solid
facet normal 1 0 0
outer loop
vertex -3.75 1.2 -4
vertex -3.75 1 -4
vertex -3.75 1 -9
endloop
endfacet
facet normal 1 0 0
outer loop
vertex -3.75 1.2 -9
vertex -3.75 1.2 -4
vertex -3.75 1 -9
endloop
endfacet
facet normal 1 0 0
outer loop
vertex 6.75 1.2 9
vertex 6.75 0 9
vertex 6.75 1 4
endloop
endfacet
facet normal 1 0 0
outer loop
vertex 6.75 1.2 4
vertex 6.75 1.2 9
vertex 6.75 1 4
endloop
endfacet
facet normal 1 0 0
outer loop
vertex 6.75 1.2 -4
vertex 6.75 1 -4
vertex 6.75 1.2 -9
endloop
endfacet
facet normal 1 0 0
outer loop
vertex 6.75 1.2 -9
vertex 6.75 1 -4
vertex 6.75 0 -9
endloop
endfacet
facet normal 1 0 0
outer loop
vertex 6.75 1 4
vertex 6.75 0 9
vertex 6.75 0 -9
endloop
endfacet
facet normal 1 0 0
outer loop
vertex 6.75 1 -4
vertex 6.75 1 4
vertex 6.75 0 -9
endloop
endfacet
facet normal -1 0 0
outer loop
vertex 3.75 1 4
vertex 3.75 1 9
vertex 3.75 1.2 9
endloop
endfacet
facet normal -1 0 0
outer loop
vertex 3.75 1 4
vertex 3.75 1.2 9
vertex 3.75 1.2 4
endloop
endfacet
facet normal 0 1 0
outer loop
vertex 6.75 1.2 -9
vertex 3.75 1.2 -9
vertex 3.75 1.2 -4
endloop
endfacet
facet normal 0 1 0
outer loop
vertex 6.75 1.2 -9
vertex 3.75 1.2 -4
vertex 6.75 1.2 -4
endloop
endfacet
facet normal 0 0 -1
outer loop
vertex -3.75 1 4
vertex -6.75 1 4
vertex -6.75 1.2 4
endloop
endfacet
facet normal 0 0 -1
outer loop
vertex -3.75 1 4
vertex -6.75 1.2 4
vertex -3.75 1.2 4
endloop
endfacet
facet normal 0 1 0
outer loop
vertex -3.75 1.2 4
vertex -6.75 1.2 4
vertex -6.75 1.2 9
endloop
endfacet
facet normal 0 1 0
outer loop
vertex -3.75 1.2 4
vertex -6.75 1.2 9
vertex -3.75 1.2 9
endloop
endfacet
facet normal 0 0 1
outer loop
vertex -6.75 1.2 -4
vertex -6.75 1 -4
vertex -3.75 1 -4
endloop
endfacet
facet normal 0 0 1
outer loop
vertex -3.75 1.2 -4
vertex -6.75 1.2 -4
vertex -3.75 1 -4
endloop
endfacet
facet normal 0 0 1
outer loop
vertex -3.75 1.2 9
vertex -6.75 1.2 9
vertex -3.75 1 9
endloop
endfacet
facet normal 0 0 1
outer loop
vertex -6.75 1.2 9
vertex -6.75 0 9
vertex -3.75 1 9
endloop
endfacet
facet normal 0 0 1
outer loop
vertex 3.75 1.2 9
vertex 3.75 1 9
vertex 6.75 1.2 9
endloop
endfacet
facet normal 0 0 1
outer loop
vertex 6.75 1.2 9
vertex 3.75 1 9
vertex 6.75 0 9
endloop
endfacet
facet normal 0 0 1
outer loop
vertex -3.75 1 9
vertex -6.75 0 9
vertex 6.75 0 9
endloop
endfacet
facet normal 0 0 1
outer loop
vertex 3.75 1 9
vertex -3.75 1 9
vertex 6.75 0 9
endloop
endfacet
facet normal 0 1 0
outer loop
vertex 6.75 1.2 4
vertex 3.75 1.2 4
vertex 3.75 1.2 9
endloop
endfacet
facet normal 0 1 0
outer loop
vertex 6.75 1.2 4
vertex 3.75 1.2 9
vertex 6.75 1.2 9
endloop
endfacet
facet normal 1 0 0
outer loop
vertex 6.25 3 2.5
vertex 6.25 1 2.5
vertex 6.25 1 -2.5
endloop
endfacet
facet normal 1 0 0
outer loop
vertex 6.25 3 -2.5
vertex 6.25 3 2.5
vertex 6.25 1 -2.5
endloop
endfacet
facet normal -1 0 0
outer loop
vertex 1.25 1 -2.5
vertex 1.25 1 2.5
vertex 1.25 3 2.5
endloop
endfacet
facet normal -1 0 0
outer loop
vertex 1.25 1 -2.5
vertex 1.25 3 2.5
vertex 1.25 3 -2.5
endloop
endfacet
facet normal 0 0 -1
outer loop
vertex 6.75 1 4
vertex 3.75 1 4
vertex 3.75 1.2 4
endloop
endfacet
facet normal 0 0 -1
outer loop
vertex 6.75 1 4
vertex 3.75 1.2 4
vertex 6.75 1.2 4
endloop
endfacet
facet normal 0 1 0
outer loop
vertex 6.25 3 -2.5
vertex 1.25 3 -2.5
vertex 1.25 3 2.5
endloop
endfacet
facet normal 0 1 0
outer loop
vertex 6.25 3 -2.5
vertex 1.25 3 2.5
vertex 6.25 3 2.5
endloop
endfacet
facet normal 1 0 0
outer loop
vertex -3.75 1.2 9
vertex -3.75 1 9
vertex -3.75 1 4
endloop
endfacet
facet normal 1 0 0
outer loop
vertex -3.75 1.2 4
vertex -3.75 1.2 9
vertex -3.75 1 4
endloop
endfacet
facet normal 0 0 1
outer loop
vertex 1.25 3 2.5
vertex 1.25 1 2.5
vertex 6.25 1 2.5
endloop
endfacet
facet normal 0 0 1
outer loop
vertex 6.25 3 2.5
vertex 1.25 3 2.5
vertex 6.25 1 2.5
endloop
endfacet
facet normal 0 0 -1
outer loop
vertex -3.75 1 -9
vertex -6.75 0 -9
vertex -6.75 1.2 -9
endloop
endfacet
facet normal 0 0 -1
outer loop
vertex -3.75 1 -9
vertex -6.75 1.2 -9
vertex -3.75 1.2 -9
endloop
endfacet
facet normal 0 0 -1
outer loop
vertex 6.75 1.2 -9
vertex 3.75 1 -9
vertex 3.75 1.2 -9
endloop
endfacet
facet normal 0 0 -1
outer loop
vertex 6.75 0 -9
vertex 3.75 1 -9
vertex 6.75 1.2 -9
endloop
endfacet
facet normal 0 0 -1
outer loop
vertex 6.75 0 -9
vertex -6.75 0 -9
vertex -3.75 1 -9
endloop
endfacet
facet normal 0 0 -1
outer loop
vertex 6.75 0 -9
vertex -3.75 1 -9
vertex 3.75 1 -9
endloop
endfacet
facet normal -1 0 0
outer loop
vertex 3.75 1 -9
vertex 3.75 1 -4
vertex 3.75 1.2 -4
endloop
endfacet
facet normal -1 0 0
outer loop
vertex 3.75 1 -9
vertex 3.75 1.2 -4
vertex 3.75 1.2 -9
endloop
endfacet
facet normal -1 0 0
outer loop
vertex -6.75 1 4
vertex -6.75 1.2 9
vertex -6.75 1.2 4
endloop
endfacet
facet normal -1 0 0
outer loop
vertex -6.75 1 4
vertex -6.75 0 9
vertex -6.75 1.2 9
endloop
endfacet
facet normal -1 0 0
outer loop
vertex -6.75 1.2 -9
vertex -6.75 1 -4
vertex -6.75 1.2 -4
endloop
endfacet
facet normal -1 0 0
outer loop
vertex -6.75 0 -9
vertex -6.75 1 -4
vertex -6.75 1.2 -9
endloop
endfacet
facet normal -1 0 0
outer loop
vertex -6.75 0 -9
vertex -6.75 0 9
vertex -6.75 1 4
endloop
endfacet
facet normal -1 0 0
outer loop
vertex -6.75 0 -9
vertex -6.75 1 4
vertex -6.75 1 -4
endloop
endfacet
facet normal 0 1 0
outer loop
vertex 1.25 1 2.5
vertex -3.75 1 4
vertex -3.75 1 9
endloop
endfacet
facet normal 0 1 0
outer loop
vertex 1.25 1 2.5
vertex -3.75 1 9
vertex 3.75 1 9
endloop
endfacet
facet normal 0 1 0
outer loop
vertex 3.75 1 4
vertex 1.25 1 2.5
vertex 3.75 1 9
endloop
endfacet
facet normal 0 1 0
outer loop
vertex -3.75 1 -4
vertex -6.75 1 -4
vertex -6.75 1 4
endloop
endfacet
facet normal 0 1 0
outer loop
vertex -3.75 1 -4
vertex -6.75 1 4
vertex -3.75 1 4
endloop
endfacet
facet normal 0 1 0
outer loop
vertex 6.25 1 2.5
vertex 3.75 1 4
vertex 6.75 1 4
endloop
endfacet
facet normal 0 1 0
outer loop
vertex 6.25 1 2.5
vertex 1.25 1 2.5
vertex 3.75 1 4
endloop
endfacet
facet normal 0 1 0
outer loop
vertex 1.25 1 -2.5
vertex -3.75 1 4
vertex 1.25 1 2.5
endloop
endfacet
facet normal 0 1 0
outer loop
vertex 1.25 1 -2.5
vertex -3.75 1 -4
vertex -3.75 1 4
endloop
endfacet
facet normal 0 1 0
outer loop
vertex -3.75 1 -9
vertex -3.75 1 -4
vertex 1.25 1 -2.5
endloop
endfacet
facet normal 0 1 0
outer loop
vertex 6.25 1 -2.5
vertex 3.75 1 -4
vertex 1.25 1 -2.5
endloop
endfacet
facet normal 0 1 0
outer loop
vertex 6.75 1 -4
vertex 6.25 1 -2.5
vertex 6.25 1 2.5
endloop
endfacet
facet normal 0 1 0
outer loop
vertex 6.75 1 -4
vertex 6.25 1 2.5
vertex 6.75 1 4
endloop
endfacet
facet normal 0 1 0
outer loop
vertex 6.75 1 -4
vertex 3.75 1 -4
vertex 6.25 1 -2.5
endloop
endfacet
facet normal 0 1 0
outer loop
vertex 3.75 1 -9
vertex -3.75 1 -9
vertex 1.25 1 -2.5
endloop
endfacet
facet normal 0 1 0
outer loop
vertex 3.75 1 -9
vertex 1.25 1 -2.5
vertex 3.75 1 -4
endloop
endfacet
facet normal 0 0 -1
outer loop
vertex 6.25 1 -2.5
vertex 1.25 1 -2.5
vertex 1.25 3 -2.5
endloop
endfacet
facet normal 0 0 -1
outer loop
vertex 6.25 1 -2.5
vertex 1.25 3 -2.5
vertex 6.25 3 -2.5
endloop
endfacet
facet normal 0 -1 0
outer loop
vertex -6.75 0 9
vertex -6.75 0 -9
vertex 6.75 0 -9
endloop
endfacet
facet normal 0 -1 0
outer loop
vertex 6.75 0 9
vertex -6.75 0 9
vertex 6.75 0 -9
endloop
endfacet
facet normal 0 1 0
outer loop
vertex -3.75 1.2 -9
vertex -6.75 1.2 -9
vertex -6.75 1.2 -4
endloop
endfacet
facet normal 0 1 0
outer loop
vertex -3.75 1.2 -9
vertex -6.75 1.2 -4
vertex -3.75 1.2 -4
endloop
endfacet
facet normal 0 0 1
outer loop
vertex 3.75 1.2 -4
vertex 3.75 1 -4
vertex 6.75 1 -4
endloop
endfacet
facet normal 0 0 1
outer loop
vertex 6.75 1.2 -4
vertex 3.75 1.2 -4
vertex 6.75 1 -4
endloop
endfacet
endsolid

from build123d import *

# Parameters (mm, degrees)
SKETCH_1_W      = 13.5
SKETCH_1_H      = 18
EXTRUDE_1_DEPTH = 1
SKETCH_2_W      = 3
SKETCH_2_H      = 5
EXTRUDE_2_DEPTH = 0.2
SKETCH_3_W      = 5
SKETCH_3_H      = 5
EXTRUDE_3_DEPTH = 2


with BuildPart() as part:
    # Эскиз1 → Бобышка-Вытянуть1 (new body)
    with BuildSketch(Plane(origin=(0, 0, 0), x_dir=(1, 0, 0), z_dir=(0, 1, 0))):
        Rectangle(SKETCH_1_W, SKETCH_1_H)
    extrude(amount=EXTRUDE_1_DEPTH)

    # Эскиз2 → Бобышка-Вытянуть2 (add)
    with BuildSketch(Plane(origin=(0, 1, 0), x_dir=(1, 0, 0), z_dir=(0, 1, 0))):
        with Locations((-5.25, -6.5)):
            Rectangle(SKETCH_2_W, SKETCH_2_H)
        with Locations((5.25, -6.5)):
            Rectangle(SKETCH_2_W, SKETCH_2_H)
        with Locations((-5.25, 6.5)):
            Rectangle(SKETCH_2_W, SKETCH_2_H)
        with Locations((5.25, 6.5)):
            Rectangle(SKETCH_2_W, SKETCH_2_H)
    extrude(amount=EXTRUDE_2_DEPTH)

    # Эскиз3 → Бобышка-Вытянуть3 (add)
    with BuildSketch(Plane(origin=(0, 1, 0), x_dir=(1, 0, 0), z_dir=(0, 1, 0))):
        with Locations((3.75, 0)):
            Rectangle(SKETCH_3_W, SKETCH_3_H)
    extrude(amount=EXTRUDE_3_DEPTH)


solid = part.part
